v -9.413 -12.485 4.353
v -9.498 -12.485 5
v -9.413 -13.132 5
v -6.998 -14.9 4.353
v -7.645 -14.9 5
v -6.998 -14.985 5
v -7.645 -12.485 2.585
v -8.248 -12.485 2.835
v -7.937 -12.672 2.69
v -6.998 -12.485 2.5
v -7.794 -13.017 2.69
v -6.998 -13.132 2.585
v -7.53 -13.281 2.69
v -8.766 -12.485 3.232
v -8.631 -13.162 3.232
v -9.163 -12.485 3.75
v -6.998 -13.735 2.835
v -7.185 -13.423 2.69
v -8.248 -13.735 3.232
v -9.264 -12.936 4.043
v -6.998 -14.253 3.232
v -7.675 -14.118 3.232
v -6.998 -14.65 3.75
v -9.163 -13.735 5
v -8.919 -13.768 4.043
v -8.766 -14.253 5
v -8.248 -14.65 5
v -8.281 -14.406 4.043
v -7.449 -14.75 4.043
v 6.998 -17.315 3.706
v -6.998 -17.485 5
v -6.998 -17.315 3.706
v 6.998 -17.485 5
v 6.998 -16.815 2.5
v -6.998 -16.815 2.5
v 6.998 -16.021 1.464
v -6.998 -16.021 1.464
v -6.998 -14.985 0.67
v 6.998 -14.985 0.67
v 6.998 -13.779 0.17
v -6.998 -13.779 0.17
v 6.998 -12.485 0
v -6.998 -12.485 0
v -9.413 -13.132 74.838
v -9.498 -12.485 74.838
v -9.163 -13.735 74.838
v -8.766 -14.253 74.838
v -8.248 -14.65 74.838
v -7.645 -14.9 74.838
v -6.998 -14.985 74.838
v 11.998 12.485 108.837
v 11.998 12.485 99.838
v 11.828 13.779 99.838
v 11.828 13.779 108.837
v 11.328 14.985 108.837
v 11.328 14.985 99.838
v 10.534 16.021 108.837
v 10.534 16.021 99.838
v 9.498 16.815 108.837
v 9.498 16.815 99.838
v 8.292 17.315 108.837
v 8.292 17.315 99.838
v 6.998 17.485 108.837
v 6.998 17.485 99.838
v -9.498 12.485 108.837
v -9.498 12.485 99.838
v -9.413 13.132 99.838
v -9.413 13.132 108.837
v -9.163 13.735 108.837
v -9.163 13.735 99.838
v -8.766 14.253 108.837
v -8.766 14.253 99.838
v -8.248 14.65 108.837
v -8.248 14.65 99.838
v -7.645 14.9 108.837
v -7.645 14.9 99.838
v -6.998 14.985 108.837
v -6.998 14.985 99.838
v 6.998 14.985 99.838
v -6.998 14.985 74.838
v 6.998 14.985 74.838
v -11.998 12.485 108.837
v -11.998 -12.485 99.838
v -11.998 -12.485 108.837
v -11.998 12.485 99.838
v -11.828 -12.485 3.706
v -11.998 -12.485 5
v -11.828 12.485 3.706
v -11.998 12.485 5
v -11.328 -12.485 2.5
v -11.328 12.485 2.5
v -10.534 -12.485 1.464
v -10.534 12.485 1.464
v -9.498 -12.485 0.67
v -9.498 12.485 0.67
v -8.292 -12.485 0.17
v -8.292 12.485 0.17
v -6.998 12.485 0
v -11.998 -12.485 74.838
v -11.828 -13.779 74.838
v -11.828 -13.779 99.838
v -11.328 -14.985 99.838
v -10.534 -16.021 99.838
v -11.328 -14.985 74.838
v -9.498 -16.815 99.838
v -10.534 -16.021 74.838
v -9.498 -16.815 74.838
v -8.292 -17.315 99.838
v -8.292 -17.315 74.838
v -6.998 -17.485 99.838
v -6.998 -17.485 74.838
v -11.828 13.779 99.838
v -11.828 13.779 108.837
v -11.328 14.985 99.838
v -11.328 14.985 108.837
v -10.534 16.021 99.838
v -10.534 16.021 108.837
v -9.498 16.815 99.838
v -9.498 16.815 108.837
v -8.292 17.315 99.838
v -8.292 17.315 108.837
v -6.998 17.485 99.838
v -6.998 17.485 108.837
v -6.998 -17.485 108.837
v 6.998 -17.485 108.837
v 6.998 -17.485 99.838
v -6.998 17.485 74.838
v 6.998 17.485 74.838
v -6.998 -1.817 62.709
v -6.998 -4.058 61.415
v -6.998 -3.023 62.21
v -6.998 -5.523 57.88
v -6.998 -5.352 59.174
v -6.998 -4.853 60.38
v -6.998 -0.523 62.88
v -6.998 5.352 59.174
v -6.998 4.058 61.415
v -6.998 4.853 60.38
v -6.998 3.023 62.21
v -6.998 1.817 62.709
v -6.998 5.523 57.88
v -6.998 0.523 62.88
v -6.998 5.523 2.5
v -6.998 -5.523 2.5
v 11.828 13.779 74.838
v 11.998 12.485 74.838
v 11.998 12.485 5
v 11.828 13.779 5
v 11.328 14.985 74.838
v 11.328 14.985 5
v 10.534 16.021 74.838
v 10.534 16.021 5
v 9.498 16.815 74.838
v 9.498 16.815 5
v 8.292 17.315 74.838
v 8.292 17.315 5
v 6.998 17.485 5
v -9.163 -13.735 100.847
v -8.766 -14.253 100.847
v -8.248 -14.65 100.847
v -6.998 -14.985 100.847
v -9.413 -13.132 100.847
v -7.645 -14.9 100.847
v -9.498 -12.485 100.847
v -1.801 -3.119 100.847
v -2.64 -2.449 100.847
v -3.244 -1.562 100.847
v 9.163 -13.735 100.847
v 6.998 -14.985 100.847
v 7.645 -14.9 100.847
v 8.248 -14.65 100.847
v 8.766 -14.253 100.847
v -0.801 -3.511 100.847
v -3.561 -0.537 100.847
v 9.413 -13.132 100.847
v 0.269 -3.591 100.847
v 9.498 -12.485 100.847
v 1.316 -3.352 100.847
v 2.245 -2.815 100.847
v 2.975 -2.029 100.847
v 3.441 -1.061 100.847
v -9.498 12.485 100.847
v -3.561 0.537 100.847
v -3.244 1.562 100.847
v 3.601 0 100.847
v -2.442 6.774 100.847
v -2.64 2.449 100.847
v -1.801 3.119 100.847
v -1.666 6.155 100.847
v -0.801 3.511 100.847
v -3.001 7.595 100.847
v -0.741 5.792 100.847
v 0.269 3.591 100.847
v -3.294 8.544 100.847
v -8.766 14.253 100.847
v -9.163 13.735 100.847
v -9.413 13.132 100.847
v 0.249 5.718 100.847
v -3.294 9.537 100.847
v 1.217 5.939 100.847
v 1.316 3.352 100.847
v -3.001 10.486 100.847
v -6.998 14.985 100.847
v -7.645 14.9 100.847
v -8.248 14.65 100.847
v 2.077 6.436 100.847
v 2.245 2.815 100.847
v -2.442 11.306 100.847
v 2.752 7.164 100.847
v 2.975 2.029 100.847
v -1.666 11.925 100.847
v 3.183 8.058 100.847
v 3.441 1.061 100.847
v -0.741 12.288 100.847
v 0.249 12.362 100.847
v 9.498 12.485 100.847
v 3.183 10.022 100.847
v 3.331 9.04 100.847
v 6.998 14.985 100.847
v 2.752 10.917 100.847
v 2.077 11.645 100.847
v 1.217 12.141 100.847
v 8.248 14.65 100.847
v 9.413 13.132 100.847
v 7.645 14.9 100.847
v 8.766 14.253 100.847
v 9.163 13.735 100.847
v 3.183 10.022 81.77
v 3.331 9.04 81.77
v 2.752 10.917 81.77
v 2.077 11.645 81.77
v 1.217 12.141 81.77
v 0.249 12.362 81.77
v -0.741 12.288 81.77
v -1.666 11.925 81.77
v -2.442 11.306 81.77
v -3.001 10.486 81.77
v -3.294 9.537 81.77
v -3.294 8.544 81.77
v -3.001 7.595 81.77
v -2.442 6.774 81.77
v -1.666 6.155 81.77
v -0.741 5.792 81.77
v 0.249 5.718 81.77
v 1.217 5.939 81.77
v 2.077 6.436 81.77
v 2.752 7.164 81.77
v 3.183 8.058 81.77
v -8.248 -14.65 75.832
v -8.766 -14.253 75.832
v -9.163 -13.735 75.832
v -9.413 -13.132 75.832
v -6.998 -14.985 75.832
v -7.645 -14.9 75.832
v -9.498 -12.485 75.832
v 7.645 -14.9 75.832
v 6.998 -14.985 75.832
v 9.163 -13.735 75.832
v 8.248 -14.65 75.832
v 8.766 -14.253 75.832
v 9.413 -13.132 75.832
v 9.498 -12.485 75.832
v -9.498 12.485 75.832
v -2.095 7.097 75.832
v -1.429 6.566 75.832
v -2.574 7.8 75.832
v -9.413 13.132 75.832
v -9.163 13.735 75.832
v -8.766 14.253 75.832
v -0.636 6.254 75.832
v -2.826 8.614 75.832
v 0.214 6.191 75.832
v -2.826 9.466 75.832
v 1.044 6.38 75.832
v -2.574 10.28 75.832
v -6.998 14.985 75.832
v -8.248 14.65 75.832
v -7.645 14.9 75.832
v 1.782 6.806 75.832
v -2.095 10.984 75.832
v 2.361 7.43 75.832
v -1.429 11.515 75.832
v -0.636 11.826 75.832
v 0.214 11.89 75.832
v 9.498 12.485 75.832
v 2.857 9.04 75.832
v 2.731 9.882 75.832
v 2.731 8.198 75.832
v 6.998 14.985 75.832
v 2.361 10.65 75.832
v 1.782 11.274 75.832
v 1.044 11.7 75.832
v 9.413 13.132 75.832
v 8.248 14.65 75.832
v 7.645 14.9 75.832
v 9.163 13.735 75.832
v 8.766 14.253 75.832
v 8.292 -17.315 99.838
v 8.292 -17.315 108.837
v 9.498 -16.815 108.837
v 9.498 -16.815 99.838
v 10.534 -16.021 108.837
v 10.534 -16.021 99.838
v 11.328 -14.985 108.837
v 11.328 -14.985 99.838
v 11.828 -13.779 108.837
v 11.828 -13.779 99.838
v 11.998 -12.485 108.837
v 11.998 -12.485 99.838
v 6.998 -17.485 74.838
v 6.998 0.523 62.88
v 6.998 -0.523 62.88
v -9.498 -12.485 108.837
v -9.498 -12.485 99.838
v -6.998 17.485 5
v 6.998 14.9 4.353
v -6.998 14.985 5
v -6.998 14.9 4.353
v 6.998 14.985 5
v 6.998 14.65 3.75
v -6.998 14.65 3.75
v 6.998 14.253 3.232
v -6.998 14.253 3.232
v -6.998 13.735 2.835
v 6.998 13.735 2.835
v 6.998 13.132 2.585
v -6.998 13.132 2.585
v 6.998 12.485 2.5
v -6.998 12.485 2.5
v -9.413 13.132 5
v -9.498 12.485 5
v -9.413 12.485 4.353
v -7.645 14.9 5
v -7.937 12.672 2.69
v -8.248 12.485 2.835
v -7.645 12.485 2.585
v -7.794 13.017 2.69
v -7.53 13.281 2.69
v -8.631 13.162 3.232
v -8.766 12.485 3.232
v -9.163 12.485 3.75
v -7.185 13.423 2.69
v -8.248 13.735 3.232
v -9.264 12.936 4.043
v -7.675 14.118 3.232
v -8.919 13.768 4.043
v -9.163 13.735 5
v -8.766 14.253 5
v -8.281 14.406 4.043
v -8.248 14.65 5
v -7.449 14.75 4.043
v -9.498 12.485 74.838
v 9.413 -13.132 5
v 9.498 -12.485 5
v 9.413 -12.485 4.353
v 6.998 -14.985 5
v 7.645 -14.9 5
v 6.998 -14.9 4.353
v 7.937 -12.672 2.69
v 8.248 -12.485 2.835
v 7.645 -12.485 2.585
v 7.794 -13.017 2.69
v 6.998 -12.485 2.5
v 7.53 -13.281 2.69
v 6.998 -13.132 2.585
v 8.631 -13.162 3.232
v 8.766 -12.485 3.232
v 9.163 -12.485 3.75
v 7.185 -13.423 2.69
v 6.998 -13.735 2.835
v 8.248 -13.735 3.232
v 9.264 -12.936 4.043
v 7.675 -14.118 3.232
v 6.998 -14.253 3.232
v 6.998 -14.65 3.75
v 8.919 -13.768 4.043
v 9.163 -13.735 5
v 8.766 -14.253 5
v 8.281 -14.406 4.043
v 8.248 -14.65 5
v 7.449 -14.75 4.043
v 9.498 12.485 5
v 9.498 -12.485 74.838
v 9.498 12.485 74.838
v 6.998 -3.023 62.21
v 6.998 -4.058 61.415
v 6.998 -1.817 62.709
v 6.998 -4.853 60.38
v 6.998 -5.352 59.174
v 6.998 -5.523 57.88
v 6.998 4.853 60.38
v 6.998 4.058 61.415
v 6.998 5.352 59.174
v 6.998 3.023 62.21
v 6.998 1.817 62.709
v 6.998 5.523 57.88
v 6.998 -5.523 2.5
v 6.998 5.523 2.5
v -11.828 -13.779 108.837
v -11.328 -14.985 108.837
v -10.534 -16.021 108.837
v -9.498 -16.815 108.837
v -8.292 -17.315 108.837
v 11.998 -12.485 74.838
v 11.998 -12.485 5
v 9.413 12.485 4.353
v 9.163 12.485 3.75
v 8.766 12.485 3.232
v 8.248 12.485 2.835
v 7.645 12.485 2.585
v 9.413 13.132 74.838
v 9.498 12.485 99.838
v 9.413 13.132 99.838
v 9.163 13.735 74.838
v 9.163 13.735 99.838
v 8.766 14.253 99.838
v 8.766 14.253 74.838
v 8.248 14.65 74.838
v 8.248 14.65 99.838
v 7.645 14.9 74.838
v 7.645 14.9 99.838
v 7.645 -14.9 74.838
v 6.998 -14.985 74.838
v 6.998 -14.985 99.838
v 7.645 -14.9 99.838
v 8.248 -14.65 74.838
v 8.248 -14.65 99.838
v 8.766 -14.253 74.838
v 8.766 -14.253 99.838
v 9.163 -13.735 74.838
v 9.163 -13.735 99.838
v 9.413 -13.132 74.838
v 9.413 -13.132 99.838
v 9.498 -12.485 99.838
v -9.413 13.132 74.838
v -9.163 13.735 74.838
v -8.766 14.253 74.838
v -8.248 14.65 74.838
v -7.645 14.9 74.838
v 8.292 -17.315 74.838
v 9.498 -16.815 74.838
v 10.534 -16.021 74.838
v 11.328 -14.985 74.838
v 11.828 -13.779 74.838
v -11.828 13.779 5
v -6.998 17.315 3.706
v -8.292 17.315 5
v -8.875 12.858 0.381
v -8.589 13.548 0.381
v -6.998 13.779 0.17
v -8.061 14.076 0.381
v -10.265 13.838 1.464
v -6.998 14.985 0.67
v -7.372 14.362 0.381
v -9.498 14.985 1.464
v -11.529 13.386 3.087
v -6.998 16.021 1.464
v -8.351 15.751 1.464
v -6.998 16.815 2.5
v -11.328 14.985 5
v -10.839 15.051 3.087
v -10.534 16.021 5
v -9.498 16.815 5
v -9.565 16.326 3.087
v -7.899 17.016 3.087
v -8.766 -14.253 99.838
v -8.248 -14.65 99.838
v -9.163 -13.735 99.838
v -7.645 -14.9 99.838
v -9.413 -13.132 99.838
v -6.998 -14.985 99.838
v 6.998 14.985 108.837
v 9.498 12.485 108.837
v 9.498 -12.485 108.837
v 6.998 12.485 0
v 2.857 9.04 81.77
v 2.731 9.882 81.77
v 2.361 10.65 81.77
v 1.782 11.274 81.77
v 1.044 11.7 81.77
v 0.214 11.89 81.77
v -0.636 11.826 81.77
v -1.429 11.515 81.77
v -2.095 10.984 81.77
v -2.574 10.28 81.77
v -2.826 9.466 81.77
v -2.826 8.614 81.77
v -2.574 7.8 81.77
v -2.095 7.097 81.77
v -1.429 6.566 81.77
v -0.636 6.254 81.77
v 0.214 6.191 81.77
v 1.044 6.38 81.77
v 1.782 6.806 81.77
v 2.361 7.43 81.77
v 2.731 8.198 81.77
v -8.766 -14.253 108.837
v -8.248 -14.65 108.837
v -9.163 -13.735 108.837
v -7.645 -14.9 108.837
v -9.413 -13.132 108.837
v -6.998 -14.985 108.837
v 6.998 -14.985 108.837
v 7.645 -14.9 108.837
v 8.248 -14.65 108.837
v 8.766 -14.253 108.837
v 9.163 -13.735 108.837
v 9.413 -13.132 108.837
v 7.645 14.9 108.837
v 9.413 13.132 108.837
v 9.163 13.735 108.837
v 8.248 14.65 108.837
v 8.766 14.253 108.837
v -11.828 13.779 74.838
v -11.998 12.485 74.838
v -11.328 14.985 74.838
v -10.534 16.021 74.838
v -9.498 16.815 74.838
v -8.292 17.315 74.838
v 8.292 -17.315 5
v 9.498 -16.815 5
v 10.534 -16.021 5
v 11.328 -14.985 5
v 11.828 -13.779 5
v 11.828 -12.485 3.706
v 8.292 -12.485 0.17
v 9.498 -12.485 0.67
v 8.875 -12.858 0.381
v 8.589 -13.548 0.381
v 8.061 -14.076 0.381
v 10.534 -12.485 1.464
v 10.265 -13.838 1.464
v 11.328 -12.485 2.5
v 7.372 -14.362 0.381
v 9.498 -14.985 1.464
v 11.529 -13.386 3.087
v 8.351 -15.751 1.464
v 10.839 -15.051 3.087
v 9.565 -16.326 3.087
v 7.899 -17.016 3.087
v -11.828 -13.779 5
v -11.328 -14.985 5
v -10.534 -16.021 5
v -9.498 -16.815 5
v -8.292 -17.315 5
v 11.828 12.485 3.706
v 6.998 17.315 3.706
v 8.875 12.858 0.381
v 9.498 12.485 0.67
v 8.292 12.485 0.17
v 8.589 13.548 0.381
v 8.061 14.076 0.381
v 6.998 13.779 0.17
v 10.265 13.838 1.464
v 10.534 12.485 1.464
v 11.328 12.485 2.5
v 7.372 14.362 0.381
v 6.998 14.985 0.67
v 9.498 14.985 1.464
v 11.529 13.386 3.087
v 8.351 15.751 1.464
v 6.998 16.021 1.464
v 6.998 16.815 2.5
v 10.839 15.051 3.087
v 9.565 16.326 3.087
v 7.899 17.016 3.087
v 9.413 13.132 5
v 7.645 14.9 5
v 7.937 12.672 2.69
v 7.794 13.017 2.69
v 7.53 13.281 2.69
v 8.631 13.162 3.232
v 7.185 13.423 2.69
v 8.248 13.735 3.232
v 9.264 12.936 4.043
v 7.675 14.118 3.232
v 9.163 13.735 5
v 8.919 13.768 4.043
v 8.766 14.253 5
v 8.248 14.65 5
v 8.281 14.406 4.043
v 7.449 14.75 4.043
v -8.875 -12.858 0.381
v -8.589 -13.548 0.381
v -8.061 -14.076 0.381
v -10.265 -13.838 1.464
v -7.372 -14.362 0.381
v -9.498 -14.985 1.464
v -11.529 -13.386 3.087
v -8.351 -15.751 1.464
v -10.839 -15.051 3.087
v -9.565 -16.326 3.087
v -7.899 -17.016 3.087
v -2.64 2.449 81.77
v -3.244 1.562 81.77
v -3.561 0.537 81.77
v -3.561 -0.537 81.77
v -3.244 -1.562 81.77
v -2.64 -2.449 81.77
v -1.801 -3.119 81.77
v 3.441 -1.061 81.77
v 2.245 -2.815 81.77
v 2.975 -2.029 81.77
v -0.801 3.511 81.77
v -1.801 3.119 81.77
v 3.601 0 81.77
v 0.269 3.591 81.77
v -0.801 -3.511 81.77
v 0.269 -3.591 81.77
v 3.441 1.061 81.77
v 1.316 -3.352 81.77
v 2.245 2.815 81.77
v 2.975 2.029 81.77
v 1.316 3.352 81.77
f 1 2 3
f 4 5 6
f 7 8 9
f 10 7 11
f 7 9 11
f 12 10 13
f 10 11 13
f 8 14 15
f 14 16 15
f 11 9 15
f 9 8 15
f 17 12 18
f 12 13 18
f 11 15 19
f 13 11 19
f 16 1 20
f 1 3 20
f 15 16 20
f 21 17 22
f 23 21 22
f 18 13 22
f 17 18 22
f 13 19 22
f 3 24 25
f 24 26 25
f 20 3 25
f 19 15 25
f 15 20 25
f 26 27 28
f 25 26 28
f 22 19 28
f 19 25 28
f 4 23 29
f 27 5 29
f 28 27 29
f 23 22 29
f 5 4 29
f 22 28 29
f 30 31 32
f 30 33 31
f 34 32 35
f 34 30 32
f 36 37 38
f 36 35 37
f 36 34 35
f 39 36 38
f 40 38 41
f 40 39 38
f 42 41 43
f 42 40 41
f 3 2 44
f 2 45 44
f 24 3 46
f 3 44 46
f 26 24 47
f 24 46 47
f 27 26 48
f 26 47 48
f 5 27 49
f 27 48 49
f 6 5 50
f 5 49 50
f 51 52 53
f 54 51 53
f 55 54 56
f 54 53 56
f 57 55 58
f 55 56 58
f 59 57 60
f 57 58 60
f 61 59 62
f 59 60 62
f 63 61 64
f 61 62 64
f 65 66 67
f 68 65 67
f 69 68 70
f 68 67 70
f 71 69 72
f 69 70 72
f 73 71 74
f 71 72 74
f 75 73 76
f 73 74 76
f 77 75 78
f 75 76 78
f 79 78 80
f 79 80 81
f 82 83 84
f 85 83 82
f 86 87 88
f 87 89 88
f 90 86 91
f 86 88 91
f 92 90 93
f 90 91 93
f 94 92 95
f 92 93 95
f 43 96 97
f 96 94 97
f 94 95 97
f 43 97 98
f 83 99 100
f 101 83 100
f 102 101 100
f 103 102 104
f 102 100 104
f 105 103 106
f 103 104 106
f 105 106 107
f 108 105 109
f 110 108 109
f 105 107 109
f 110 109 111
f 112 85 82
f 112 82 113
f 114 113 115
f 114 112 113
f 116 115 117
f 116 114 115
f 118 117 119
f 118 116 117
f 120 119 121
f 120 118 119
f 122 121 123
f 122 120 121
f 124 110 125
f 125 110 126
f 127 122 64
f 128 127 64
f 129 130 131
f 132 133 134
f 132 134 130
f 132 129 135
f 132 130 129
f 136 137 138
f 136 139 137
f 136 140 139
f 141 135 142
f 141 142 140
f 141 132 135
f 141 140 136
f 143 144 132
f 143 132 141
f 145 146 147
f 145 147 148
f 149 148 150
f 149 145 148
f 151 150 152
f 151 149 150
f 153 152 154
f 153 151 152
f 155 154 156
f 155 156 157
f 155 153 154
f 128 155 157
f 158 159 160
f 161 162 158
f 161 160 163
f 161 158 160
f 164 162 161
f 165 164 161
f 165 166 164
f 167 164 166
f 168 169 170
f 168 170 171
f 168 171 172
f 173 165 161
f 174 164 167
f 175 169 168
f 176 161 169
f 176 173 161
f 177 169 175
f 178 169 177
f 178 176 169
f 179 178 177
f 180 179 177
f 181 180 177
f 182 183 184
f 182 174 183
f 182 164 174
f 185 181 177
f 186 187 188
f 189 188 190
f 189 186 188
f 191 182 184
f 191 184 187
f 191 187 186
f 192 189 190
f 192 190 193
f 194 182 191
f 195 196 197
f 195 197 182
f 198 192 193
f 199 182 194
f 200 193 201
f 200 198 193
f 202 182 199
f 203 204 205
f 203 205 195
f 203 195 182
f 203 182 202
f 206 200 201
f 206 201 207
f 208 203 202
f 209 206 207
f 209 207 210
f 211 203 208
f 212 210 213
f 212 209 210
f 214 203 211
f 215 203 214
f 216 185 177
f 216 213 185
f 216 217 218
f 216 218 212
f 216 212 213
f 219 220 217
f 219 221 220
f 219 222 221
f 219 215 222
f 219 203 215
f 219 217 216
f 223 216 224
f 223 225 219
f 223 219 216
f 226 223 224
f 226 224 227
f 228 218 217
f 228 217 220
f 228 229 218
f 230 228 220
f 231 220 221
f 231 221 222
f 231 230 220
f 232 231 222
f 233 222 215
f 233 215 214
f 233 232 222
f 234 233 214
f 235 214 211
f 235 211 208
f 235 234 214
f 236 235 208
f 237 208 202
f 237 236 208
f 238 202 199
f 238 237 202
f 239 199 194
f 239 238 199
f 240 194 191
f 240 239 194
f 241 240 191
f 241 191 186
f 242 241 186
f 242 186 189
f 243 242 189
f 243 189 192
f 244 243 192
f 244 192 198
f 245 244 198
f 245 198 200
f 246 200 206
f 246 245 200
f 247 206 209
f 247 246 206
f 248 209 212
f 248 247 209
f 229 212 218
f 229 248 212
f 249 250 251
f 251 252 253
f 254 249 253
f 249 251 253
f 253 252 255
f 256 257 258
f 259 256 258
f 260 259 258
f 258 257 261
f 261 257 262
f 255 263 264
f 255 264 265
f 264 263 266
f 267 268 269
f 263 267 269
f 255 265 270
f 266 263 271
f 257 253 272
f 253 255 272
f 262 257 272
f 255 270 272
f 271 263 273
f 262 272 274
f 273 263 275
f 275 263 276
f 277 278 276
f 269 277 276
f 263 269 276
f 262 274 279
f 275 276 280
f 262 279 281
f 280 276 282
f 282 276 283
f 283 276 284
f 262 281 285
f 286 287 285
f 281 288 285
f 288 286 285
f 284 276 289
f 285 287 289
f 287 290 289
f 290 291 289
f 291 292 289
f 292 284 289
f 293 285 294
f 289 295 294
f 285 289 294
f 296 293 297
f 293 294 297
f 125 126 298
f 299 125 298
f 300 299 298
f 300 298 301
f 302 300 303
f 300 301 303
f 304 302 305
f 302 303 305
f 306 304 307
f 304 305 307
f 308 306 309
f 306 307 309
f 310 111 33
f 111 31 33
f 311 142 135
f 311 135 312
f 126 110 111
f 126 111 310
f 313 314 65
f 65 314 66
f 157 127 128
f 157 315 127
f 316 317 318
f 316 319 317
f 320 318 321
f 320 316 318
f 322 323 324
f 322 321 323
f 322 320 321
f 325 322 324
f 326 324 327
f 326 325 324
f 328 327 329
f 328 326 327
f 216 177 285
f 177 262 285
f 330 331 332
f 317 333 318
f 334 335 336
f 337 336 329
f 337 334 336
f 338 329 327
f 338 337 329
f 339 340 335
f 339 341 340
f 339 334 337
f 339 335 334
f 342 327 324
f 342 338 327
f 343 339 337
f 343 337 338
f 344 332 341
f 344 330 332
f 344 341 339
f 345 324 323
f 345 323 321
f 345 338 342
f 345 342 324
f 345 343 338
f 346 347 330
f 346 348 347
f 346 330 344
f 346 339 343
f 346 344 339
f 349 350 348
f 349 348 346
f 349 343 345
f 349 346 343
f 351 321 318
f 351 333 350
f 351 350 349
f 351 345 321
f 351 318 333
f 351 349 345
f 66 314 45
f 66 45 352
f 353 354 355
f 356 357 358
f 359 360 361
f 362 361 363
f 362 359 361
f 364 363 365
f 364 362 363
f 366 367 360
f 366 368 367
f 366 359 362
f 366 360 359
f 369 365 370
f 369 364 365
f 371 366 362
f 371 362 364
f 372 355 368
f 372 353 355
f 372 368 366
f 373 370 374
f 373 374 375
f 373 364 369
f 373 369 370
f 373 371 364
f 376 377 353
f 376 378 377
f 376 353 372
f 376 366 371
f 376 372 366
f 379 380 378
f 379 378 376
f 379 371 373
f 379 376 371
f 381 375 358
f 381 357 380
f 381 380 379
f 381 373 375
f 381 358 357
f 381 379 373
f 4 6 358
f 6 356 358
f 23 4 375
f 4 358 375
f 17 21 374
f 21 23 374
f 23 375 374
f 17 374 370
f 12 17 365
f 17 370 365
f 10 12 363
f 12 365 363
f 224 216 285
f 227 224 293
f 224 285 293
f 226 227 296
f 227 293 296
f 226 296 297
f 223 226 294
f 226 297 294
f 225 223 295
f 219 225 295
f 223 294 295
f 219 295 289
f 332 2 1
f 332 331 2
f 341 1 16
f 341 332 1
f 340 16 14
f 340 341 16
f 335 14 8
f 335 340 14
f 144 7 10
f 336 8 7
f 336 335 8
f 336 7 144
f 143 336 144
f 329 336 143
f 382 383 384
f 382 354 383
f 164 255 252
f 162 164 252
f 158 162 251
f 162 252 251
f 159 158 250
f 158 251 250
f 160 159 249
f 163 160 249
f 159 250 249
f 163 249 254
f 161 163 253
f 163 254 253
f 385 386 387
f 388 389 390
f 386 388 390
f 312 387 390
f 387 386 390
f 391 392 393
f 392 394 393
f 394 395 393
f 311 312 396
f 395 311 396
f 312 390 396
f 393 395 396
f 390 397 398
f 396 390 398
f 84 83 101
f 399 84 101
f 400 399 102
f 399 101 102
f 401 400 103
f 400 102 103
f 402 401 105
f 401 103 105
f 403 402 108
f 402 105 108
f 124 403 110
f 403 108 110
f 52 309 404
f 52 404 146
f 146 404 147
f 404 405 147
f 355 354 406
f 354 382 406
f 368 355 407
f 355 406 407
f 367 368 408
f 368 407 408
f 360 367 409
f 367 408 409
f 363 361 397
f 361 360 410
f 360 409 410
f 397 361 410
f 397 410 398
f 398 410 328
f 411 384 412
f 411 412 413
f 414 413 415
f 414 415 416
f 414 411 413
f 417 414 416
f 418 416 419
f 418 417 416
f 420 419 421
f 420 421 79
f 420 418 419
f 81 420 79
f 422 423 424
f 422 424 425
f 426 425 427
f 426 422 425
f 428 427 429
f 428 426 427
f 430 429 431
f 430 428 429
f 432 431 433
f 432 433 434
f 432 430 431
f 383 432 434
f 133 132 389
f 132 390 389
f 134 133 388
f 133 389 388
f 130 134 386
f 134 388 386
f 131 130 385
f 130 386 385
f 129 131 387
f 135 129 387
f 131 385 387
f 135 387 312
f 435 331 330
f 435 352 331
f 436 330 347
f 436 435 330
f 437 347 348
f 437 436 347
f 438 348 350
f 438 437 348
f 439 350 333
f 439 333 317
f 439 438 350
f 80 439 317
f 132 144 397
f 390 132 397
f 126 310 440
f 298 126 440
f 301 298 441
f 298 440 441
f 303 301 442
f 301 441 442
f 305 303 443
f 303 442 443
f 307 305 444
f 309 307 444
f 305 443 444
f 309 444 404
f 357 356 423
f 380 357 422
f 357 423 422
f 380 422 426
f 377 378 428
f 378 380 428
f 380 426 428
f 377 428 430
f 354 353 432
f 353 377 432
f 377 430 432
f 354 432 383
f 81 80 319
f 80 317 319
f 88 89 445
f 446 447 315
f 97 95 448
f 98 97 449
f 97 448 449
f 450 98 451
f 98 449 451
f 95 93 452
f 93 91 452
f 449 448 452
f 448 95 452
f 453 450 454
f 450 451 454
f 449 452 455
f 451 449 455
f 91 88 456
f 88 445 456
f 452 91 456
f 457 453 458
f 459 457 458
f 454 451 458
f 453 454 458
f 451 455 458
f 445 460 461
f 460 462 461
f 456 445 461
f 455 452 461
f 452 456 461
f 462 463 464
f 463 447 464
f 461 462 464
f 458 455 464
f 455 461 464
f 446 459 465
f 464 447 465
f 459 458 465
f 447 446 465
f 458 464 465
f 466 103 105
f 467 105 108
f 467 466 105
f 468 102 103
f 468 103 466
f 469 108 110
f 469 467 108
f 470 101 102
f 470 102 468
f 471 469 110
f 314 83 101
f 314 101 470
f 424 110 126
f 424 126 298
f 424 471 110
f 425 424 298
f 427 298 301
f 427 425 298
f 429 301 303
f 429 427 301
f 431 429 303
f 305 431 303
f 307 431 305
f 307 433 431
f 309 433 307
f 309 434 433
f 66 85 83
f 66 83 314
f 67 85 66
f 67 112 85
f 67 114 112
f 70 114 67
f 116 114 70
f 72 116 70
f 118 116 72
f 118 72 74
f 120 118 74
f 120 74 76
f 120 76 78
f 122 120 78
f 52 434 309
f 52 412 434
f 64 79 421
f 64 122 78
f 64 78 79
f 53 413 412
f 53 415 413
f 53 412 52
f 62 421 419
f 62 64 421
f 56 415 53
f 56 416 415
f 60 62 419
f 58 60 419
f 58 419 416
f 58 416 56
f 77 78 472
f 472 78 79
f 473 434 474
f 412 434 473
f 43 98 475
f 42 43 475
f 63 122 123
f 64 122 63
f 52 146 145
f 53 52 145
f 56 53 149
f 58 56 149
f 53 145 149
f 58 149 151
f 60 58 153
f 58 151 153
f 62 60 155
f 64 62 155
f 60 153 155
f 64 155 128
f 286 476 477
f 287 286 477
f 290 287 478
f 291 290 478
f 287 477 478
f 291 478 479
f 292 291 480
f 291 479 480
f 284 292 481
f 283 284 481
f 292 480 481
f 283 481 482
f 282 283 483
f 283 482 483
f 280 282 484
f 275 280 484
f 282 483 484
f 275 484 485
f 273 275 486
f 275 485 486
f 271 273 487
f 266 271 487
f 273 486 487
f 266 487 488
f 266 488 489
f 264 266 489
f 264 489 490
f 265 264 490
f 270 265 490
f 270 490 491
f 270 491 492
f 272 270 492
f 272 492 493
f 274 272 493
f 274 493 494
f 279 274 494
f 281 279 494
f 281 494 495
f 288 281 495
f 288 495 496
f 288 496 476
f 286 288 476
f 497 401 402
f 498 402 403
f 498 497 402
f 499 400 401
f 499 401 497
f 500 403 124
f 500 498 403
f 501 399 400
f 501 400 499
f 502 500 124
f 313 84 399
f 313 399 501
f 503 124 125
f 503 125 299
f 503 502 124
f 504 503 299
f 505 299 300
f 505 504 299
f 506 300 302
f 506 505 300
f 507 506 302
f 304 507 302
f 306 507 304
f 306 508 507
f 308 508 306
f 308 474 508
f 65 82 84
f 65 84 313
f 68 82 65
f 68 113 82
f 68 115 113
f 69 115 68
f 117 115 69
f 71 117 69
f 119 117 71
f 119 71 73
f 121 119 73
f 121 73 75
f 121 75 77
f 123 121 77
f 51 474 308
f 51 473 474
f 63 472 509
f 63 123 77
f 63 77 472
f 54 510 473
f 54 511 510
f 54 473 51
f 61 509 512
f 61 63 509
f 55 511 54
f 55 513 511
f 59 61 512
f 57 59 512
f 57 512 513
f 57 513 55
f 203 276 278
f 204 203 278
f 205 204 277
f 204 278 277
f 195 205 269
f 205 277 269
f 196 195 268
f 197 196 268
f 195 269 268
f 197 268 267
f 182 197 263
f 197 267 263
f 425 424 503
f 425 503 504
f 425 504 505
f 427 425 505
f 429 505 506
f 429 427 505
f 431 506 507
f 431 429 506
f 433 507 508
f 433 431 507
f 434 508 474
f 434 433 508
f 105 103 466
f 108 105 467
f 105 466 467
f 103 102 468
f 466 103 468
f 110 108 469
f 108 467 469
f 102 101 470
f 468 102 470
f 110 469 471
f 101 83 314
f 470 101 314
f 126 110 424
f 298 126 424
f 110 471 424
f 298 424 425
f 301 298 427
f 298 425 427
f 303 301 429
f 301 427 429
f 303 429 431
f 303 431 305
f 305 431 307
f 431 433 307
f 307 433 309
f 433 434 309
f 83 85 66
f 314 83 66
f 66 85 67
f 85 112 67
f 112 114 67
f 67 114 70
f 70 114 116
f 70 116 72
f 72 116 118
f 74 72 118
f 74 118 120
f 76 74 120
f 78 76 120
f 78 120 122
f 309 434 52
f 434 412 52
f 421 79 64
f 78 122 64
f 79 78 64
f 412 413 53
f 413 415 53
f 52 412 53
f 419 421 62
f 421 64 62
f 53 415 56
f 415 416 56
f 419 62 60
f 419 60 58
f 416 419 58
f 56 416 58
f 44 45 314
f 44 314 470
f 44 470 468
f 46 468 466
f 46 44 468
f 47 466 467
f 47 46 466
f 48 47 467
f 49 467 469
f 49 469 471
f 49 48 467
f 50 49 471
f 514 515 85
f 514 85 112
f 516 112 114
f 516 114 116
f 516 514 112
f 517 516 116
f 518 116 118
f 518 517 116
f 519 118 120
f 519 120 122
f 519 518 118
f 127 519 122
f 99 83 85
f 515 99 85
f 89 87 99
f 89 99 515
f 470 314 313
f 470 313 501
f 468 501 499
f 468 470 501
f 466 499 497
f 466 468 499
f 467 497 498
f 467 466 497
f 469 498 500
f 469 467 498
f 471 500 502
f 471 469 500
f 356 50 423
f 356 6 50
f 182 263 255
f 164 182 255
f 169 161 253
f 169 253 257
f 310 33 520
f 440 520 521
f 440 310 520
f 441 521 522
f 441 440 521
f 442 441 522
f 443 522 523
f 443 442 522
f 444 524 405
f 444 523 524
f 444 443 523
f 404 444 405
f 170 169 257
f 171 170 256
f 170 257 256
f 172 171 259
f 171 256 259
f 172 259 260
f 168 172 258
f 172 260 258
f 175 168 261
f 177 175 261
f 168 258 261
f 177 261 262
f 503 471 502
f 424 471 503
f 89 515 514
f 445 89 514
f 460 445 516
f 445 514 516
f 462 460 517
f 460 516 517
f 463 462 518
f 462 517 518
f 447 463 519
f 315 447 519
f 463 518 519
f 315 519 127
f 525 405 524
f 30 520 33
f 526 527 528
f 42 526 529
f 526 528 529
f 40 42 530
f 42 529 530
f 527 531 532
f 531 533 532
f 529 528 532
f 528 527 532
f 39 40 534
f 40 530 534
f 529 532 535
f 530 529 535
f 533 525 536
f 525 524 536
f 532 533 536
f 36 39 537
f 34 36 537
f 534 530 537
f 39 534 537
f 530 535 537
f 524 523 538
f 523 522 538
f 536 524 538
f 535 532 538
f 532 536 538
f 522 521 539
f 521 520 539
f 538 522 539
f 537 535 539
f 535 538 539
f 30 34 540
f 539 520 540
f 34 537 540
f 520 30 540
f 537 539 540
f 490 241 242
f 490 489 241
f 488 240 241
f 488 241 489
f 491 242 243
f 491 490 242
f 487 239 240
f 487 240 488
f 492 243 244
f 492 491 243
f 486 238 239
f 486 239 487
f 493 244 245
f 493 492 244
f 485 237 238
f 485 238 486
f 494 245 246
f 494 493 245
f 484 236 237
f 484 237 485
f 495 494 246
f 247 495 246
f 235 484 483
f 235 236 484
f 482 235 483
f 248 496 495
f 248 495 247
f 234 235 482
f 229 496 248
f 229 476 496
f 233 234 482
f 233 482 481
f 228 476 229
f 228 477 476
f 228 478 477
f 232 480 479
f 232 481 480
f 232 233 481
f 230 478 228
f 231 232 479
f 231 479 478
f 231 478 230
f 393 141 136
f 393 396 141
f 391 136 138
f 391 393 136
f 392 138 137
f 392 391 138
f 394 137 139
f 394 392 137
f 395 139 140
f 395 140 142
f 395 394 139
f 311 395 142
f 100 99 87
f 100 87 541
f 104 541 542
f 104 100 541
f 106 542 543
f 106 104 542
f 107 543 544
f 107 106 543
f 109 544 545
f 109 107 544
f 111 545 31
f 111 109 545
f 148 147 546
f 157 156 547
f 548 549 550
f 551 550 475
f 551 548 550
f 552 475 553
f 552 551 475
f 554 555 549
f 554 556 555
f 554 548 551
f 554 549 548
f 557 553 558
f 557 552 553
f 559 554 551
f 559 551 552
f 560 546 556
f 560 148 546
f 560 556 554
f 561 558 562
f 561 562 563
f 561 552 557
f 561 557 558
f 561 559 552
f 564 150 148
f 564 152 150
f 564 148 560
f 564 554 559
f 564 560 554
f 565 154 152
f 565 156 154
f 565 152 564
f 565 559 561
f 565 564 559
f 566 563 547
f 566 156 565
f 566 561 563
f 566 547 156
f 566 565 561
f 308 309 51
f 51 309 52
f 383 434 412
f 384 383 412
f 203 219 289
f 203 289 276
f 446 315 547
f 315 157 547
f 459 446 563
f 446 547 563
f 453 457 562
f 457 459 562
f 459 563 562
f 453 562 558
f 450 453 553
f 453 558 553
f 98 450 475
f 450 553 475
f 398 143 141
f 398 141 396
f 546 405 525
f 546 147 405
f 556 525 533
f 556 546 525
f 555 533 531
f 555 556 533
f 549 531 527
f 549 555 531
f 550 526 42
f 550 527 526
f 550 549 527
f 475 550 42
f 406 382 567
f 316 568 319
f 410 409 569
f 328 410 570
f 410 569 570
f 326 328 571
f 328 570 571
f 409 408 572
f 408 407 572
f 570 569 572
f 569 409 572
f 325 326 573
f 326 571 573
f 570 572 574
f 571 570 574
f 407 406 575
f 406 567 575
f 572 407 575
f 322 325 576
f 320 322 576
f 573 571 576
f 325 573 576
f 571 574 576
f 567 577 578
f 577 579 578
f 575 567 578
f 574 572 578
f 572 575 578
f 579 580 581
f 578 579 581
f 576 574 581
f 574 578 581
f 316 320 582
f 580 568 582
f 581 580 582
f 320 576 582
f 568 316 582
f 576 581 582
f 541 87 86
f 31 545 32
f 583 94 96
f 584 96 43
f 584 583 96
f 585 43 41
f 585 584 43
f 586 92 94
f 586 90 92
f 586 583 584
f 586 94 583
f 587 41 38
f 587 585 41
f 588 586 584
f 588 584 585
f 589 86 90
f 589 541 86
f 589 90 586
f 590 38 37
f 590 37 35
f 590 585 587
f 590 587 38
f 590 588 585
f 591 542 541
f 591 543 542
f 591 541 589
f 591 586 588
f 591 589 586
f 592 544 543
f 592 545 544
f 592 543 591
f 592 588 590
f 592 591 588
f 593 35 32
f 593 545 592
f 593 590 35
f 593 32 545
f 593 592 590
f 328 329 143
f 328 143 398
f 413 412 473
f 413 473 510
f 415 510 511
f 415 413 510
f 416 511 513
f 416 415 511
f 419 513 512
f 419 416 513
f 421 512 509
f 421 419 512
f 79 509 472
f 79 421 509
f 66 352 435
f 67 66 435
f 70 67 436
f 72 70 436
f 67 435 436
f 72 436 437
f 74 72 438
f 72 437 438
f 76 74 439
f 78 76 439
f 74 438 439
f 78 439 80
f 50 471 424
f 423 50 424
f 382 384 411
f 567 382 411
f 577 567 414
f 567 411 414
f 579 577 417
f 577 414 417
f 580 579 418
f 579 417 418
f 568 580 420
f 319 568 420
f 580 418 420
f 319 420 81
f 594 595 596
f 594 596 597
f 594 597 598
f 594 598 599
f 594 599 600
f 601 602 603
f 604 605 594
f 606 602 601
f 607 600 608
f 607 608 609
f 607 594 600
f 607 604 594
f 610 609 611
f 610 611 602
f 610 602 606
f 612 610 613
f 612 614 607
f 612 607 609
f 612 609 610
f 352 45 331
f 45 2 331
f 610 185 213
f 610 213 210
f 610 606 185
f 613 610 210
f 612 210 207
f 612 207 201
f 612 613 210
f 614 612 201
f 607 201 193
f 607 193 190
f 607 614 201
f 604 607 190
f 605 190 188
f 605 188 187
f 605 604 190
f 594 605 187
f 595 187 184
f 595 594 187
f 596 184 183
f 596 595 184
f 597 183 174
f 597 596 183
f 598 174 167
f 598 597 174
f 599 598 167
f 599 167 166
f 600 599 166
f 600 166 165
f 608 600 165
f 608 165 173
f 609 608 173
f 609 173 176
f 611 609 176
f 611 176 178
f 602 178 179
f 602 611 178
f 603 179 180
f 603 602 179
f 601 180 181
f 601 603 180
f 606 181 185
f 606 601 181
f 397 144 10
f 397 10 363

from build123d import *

# Parameters (mm, degrees)
F0_W      = 23.996502161
F0_H      = 34.9701493979
F1_DEPTH  = 74.8382490128
F2_R      = 5
F3_T      = -2.5
F4_W      = 13.996502161
F4_H      = 11.0455658287
F5_DEPTH  = 60.3796765208
F6_R      = 5
F7_DEPTH  = 25
F9_DEPTH  = 24.0058777854
F10_R     = 3.3312129282
F10_R_2   = 3.6010333326
F11_DEPTH = 18.0684719235
F12_R     = 2.8574653166
F13_DEPTH = 25
F14_DEPTH = 1.0086121038
F15_DEPTH = 8.999126032


with BuildPart() as f1:
    # F0 (on Top) → F1 (new body)
    with BuildSketch(Plane.XY):
        Rectangle(F0_W, F0_H)
    extrude(amount=F1_DEPTH)

    # F2
    f2_edges = [f1.edges().sort_by_distance(p)[0] for p in [
        (11.998251, -17.485075, 37.419125),
        (11.998251, 17.485075, 37.419125),
        (-11.998251, 17.485075, 37.419125),
        (-11.998251, -17.485075, 37.419125),
        (-11.998251, 0, 0),
        (11.998251, 0, 0),
        (0, 17.485075, 0),
        (0, -17.485075, 0),
    ]]
    fillet(f2_edges, radius=F2_R)

    # F3
    f3_openings = [f1.faces().sort_by_distance(p)[0] for p in [
        (0, 0, 74.838249),
    ]]
    offset(amount=F3_T, openings=f3_openings)

    # F4 (on face) → F5 (join)
    with BuildSketch(Plane.XY.offset(2.5)):
        Rectangle(F4_W, F4_H)
    extrude(amount=F5_DEPTH)

    # F6
    f6_edges = [f1.edges().sort_by_distance(p)[0] for p in [
        (0, -5.522783, 62.879677),
        (0, 5.522783, 62.879677),
    ]]
    fillet(f6_edges, radius=F6_R)

    # F7 (add): a face of the model
    f7_faces = [f1.faces().sort_by_distance(p)[0] for p in [
        (0, -17.0609587402, 74.8382490128),
    ]]
    extrude(f7_faces, amount=F7_DEPTH)


with BuildPart() as f9:
    # F8 (on face) → F9 (new body)
    with BuildSketch(Plane.XY.offset(99.8382490128)):
        with BuildLine():
            Line((-6.9982510805, -14.9850746989), (6.9982510805, -14.9850746989))
            ThreePointArc((6.9982510805, -14.9850746989), (8.7660180335, -14.2528416519), (9.4982510805, -12.4850746989))
            Line((9.4982510805, -12.4850746989), (9.4982510805, 12.4850746989))
            ThreePointArc((9.4982510805, 12.4850746989), (8.7660180335, 14.2528416519), (6.9982510805, 14.9850746989))
            Line((6.9982510805, 14.9850746989), (-6.9982510805, 14.9850746989))
            ThreePointArc((-6.9982510805, 14.9850746989), (-8.7660180335, 14.2528416519), (-9.4982510805, 12.4850746989))
            Line((-9.4982510805, 12.4850746989), (-9.4982510805, -12.4850746989))
            ThreePointArc((-9.4982510805, -12.4850746989), (-8.7660180335, -14.2528416519), (-6.9982510805, -14.9850746989))
        make_face()
    extrude(amount=-F9_DEPTH)

    # F10 (on face) → F11 (cut)
    with BuildSketch(Plane.XY.offset(99.8382490128)):
        with Locations((0, 9.0401517227)):
            Circle(F10_R)
        Circle(F10_R_2)
    extrude(amount=-F11_DEPTH, mode=Mode.SUBTRACT)

    # F12 (on face) → F13 (cut)
    with BuildSketch(Plane.XY.offset(81.7697770894)):
        with Locations((0, 9.0401517227)):
            Circle(F12_R)
    extrude(amount=-F13_DEPTH, mode=Mode.SUBTRACT)

    # F14 (add): a face of the model
    f14_faces = [f9.faces().sort_by_distance(p)[0] for p in [
        (0, -14.6302399558, 99.8382490128),
    ]]
    extrude(f14_faces, amount=F14_DEPTH)


with BuildPart() as f15:
    # F15 (new): a face of the model
    f15_faces = [f1.part.faces().sort_by_distance(p)[0] for p in [
        (0, -17.0609587402, 99.8382490128),
    ]]
    extrude(f15_faces, amount=F15_DEPTH)


solid = Compound([f1.part, f9.part, f15.part])
